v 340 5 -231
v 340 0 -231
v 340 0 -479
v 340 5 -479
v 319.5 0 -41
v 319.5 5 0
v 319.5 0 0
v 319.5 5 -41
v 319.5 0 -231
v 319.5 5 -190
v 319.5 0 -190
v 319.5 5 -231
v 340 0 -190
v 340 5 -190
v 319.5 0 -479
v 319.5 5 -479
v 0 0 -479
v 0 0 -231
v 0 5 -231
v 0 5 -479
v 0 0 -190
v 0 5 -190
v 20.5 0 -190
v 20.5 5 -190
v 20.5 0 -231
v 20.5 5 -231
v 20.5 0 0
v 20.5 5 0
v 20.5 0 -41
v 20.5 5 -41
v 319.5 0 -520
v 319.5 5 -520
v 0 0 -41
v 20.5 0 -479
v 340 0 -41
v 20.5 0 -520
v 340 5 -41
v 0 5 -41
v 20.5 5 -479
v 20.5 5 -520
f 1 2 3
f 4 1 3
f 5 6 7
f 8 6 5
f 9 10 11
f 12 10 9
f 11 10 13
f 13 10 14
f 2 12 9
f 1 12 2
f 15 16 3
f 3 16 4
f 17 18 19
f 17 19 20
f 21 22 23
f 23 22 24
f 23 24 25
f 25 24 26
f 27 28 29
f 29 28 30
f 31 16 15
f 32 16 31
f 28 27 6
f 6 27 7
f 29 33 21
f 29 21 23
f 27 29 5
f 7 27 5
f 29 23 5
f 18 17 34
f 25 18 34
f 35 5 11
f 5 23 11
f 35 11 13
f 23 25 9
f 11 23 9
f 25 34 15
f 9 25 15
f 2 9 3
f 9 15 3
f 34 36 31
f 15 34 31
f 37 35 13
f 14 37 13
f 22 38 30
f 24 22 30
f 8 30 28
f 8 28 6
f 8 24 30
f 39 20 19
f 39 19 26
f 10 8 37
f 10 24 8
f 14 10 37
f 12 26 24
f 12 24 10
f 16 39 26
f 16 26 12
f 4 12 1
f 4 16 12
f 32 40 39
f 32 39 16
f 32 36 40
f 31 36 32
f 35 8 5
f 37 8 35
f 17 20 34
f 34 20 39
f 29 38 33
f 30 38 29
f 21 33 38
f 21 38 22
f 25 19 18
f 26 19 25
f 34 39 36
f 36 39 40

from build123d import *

# Parameters (mm, degrees)
SKETCH_1_W          = 340
SKETCH_1_H          = 520
EXTRUDE_1_DEPTH     = 5
SKETCH_2_W          = 20.5
SKETCH_2_H          = 41
CUT_EXTRUDE_1_DEPTH = 622.309101816
SKETCH_3_W          = 20.5
SKETCH_3_H          = 41
CUT_EXTRUDE_2_DEPTH = 15


with BuildPart() as part:
    # 스케치1 → 보스-돌출1 (new body)
    with BuildSketch(Plane(origin=(0, 0, 0), x_dir=(1, 0, 0), z_dir=(0, 1, 0))):
        with Locations((170, 260)):
            Rectangle(SKETCH_1_W, SKETCH_1_H)
    extrude(amount=EXTRUDE_1_DEPTH)

    # 스케치2 → 컷-돌출1 (cut, through all)
    with BuildSketch(Plane(origin=(0, 5, 0), x_dir=(1, 0, 0), z_dir=(0, 1, 0))):
        with Locations((329.75, 499.5)):
            Rectangle(SKETCH_2_W, SKETCH_2_H)
        with Locations((329.75, 20.5)):
            Rectangle(SKETCH_2_W, SKETCH_2_H)
        with Locations((10.25, 20.5)):
            Rectangle(SKETCH_2_W, SKETCH_2_H)
        with Locations((10.25, 499.5)):
            Rectangle(SKETCH_2_W, SKETCH_2_H)
    extrude(amount=-CUT_EXTRUDE_1_DEPTH, mode=Mode.SUBTRACT)

    # 스케치3 → 컷-돌출2 (cut)
    with BuildSketch(Plane(origin=(0, 5, 0), x_dir=(1, 0, 0), z_dir=(0, 1, 0))):
        with Locations((329.75, 210.5)):
            Rectangle(SKETCH_3_W, SKETCH_3_H)
        with Locations((10.25, 210.5)):
            Rectangle(SKETCH_3_W, SKETCH_3_H)
    extrude(amount=-CUT_EXTRUDE_2_DEPTH, mode=Mode.SUBTRACT)


solid = part.part
